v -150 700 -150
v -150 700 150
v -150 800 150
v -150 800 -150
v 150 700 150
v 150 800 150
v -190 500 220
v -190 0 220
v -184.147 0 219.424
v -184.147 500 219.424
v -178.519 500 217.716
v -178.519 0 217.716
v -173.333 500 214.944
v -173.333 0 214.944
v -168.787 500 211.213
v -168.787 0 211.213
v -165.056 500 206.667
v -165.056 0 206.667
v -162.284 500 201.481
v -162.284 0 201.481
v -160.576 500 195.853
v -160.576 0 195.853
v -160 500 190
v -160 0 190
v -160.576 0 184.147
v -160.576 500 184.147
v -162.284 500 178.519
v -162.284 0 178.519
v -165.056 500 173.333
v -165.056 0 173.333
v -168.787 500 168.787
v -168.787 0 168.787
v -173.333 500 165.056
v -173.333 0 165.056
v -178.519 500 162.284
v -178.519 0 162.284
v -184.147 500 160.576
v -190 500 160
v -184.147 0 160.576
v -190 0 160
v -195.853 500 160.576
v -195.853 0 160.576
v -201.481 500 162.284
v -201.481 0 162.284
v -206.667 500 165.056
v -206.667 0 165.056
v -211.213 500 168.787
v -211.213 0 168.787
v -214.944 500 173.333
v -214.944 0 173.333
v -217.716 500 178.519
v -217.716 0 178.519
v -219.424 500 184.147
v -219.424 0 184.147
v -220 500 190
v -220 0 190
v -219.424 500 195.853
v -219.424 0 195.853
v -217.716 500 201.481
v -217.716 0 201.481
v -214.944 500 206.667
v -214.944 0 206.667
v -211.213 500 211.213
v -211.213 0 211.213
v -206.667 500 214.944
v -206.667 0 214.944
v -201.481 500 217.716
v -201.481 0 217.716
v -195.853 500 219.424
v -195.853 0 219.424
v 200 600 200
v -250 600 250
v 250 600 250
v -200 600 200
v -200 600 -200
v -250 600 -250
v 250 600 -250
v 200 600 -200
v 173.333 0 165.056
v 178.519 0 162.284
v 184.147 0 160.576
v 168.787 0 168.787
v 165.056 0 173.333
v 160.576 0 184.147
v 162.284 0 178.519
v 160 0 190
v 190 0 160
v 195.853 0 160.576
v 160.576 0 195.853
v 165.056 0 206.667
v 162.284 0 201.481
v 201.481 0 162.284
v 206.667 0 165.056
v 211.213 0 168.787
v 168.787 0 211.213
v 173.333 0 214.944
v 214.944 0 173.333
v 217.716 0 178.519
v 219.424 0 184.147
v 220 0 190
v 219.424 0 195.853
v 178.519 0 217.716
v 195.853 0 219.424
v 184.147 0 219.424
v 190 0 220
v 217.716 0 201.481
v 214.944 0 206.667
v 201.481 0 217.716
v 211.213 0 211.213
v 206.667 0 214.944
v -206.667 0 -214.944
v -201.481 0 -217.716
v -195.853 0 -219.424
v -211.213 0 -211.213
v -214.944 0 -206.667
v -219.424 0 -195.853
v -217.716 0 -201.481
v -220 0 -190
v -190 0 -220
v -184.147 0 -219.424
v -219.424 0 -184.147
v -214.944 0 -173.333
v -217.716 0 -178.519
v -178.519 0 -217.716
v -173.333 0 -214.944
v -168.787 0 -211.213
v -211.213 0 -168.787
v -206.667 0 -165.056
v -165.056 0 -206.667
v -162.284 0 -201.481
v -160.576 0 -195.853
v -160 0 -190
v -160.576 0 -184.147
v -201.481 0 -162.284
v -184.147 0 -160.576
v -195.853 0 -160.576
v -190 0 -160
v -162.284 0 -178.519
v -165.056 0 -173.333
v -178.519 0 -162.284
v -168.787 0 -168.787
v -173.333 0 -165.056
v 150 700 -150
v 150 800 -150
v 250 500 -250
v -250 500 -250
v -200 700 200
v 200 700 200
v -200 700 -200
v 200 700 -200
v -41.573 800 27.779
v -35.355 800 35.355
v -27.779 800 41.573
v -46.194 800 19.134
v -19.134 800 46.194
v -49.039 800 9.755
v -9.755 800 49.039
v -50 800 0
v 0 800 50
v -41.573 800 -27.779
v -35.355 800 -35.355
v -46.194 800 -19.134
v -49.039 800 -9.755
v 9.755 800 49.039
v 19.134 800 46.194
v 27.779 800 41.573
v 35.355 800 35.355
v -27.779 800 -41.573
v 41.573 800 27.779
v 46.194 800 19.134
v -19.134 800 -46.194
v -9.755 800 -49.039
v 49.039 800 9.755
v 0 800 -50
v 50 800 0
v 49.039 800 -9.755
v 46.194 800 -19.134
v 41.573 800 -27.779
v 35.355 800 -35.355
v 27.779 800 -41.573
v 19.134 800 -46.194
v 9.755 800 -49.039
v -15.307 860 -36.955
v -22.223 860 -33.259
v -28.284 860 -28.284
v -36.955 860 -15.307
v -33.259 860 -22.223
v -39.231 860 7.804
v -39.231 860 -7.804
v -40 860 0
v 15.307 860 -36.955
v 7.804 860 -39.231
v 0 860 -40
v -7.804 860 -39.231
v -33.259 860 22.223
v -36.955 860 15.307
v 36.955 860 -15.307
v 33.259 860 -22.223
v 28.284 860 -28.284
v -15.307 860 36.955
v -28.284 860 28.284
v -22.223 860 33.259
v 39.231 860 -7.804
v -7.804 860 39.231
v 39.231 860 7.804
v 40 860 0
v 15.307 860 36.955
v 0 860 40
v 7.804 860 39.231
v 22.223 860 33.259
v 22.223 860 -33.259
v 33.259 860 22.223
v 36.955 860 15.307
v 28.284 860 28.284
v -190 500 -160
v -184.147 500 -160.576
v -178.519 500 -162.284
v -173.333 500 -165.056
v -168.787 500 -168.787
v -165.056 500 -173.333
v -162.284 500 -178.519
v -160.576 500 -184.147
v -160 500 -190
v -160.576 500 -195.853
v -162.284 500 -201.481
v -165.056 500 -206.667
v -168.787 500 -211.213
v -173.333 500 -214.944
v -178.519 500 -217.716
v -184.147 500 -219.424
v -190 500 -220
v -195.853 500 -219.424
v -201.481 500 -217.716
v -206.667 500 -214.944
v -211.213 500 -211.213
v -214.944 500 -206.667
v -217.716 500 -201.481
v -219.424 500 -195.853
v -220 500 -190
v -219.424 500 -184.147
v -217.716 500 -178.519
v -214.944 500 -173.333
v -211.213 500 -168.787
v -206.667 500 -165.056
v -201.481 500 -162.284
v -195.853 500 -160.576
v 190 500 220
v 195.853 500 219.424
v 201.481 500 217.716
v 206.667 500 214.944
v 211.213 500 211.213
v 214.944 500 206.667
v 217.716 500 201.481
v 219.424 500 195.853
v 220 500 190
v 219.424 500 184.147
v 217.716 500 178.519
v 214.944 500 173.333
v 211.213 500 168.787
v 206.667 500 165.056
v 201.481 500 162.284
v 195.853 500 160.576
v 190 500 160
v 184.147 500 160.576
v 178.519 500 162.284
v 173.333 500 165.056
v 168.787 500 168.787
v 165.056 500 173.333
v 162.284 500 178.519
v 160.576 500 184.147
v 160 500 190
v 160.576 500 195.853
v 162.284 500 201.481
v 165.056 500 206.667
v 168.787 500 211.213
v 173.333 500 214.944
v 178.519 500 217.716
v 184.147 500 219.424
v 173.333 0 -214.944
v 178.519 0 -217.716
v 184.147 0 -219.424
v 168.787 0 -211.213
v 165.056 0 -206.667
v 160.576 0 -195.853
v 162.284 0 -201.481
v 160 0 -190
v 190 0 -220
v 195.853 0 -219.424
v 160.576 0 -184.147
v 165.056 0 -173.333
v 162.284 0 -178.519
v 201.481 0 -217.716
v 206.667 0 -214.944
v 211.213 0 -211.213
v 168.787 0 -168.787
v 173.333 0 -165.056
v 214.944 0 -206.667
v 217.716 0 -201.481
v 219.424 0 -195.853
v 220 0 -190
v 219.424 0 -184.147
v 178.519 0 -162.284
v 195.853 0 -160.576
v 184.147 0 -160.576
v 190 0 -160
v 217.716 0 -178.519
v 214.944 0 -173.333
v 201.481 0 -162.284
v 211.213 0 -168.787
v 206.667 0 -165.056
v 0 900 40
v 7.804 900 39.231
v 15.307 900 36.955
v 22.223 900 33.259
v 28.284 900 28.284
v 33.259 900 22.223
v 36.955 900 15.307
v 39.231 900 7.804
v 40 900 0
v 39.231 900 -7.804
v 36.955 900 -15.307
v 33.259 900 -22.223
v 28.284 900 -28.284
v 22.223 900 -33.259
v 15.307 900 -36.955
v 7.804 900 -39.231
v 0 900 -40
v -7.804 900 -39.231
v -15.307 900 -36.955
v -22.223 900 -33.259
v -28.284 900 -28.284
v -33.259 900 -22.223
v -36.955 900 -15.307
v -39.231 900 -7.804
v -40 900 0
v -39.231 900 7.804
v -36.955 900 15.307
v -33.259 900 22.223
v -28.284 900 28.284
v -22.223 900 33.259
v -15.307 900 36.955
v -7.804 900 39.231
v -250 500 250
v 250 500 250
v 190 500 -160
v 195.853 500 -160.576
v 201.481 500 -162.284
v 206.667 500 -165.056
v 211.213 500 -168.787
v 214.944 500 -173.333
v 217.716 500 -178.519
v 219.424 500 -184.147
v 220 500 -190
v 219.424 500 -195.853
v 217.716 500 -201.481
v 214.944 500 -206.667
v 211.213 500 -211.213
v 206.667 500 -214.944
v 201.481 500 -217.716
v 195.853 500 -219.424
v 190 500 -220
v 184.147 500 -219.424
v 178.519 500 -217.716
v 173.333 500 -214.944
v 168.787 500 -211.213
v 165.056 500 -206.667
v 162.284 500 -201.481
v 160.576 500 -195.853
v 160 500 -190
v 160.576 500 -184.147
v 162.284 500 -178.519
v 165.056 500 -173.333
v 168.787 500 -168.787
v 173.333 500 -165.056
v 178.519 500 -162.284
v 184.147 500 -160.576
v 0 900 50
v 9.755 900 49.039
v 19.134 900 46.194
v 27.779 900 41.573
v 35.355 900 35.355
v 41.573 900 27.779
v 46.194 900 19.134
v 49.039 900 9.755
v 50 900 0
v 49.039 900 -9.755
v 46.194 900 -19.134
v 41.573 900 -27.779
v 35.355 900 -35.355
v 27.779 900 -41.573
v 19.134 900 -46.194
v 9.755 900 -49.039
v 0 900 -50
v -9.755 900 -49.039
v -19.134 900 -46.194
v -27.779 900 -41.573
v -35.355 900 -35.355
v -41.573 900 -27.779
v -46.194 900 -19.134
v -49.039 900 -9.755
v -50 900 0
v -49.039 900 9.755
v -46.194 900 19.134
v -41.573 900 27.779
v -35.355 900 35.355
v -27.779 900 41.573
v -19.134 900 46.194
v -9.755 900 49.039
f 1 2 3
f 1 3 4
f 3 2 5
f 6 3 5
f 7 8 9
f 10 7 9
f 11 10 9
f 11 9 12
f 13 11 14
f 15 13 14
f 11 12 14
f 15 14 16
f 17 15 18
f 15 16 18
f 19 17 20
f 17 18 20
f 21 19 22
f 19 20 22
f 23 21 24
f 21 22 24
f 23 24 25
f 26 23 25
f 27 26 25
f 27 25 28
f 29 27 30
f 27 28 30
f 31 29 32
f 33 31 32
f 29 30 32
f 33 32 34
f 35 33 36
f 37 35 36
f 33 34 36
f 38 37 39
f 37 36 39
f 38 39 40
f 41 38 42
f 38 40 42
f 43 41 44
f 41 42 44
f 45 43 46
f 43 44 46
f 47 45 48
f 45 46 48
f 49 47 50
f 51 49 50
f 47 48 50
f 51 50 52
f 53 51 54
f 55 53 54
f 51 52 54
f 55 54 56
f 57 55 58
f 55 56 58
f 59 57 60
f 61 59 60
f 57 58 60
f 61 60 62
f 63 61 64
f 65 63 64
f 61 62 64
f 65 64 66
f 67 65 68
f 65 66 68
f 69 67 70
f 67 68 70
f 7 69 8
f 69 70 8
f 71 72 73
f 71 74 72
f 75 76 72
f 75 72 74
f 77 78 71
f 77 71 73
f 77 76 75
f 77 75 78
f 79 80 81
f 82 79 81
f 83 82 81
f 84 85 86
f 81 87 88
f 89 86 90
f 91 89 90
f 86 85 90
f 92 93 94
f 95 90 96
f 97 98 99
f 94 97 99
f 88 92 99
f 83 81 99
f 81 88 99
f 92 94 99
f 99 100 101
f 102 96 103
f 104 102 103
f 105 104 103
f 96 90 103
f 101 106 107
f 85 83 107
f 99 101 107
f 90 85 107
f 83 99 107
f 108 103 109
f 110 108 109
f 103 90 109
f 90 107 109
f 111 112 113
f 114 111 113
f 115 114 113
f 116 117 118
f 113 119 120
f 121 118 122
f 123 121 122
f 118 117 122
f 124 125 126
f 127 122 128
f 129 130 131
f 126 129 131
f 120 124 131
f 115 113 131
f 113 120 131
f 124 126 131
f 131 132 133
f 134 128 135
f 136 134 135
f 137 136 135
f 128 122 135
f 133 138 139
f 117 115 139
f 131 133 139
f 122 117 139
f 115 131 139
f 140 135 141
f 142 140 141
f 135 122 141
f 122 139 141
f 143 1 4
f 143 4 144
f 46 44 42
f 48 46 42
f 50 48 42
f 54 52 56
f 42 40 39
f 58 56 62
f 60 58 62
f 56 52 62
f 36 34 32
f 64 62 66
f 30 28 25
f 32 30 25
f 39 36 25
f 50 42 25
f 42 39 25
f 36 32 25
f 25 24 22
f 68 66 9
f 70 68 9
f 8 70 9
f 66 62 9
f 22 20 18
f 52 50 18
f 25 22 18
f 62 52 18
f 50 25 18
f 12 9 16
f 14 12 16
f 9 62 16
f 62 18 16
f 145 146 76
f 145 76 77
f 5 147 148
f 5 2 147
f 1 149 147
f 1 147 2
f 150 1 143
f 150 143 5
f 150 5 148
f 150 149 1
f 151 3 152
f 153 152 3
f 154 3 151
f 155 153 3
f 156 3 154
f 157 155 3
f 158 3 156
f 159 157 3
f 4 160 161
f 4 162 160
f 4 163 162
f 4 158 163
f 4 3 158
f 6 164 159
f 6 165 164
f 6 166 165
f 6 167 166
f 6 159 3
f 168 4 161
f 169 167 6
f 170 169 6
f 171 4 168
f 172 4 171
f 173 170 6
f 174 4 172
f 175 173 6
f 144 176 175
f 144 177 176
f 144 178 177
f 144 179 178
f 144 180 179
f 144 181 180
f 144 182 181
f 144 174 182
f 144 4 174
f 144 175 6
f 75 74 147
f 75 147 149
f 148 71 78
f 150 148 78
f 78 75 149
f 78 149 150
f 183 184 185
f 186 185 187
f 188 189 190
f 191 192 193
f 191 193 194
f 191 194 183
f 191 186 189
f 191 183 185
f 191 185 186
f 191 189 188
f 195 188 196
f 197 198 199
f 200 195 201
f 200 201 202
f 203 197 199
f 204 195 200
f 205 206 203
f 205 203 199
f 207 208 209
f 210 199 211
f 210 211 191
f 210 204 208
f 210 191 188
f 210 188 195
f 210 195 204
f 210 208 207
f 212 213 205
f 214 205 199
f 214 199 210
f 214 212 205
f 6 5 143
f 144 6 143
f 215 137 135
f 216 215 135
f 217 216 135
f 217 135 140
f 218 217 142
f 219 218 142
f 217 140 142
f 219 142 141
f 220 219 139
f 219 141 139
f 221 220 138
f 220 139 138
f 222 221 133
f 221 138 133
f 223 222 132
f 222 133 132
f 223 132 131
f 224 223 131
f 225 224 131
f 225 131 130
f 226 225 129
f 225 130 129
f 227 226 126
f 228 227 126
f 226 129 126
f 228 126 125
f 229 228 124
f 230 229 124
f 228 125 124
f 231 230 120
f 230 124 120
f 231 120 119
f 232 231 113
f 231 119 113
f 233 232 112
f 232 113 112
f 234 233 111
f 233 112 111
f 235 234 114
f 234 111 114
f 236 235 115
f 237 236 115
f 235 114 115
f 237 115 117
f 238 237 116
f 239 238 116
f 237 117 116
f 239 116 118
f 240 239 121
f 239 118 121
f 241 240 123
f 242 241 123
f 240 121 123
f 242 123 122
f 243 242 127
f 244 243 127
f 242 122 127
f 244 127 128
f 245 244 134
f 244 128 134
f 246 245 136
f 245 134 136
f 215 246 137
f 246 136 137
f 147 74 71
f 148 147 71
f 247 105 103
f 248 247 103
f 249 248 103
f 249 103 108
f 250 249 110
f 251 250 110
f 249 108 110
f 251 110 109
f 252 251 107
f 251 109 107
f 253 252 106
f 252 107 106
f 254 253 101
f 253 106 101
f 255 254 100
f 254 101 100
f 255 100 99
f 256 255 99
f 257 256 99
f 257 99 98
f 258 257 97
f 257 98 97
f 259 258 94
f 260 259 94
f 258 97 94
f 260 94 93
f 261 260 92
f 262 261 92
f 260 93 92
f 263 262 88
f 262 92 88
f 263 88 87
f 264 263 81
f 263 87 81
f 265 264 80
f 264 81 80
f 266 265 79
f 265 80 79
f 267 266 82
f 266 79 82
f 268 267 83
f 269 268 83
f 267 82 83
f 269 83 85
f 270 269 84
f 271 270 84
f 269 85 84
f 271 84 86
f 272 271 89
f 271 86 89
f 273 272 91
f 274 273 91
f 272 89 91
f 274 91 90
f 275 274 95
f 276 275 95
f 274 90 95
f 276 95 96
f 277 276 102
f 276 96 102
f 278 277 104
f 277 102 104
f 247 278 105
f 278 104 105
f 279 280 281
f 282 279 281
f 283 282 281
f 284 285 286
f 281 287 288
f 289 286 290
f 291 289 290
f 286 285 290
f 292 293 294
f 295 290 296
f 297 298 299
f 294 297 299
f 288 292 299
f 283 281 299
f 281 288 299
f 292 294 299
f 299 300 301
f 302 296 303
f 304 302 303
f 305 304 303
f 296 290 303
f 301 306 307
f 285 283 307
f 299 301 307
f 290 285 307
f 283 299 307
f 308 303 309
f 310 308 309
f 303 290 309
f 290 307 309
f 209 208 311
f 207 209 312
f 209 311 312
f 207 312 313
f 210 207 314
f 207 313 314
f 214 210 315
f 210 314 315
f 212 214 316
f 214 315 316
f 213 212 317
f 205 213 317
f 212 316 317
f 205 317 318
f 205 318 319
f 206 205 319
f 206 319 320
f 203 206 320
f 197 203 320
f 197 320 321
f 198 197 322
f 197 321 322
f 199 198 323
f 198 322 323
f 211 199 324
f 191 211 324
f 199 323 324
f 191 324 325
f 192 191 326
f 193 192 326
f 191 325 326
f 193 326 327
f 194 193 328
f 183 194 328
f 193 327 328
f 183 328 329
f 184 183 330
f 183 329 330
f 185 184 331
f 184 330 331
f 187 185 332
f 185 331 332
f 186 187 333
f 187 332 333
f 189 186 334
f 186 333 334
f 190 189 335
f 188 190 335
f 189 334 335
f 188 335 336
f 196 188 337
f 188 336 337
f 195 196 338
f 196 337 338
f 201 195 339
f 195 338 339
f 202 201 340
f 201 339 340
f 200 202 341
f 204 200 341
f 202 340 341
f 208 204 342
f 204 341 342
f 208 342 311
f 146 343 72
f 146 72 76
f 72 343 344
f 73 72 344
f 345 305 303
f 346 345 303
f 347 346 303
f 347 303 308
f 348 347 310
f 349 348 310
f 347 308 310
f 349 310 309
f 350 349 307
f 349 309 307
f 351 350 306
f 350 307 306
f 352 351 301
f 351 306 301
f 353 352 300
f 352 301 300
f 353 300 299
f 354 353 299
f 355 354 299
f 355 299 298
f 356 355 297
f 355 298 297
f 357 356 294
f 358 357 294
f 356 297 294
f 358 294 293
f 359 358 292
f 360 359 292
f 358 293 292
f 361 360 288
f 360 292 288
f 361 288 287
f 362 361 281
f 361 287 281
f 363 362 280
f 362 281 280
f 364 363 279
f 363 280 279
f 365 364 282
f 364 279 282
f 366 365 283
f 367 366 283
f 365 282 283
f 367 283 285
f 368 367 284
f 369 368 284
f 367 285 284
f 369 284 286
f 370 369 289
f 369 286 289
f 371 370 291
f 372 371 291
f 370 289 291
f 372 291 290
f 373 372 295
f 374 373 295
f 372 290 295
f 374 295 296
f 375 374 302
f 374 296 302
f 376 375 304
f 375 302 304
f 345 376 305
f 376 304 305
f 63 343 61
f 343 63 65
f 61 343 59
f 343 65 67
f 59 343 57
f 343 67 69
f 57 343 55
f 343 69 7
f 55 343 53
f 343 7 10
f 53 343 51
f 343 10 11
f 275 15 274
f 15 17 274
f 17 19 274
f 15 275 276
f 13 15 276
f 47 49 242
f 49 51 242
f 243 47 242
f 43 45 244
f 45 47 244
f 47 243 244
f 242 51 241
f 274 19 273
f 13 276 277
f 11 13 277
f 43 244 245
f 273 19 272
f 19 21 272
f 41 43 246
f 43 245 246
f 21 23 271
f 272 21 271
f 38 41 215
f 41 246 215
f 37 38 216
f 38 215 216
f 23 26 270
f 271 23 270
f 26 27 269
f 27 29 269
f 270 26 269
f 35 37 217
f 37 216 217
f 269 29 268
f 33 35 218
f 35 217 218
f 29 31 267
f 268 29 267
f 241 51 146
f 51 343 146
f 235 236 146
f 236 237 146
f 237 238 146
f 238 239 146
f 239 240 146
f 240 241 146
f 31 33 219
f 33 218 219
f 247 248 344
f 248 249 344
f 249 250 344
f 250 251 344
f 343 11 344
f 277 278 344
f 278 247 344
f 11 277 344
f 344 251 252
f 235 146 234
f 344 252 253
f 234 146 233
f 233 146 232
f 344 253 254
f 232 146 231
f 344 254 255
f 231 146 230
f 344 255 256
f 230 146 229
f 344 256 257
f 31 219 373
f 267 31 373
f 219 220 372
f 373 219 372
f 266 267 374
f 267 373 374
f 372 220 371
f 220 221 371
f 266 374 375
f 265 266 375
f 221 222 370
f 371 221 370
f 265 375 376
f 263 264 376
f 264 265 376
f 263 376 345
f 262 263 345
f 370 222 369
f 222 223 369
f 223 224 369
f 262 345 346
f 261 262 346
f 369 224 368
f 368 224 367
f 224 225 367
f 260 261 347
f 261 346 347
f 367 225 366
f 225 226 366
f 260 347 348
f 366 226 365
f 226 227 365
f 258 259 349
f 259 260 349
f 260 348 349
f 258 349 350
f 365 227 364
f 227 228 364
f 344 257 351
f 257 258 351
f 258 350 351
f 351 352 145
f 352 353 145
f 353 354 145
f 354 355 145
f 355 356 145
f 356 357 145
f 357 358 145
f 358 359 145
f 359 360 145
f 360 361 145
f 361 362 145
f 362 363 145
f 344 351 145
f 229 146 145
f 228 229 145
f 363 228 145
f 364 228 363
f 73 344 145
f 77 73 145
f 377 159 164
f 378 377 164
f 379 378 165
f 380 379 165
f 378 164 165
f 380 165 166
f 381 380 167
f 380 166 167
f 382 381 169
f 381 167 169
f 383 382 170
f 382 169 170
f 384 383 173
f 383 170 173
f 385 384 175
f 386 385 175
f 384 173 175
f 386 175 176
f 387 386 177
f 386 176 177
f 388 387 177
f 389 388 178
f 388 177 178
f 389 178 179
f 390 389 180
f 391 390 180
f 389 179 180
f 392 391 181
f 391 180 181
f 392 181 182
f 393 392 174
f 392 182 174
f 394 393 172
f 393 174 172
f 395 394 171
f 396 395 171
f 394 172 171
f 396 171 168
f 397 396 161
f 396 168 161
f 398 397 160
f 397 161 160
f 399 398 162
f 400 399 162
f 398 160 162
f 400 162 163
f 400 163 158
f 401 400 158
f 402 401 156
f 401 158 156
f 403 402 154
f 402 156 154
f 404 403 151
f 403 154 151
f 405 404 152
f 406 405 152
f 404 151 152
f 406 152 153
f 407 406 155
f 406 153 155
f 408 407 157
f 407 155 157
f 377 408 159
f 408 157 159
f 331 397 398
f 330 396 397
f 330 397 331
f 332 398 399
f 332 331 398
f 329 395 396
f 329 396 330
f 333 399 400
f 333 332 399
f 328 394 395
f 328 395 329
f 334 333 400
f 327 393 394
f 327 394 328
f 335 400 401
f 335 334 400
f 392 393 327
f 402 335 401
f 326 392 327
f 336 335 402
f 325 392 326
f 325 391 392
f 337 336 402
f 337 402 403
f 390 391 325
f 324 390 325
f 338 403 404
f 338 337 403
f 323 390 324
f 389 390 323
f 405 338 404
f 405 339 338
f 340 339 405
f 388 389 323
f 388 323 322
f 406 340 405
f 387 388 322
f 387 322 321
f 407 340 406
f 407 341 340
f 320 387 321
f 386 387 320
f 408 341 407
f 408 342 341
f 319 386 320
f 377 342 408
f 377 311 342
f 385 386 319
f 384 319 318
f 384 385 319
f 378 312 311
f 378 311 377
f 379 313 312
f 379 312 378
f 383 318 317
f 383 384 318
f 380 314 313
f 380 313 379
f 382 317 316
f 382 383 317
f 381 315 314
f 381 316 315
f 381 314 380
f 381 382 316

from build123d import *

# Parameters (mm, degrees)
SKETCH1_R             = 30
BOSS_EXTRUDE1_DEPTH   = 500
BOSS_EXTRUDE1_2_DEPTH = 500
BOSS_EXTRUDE1_3_DEPTH = 500
BOSS_EXTRUDE1_4_DEPTH = 500
SKETCH2_W             = 500
SKETCH2_H             = 500
BOSS_EXTRUDE2_DEPTH   = 100
SKETCH3_W             = 400
SKETCH3_H             = 400
BOSS_EXTRUDE3_DEPTH   = 100
SKETCH4_W             = 300
SKETCH4_H             = 300
BOSS_EXTRUDE4_DEPTH   = 100
SKETCH5_R             = 50
BOSS_EXTRUDE5_DEPTH   = 100
SKETCH6_R             = 40
CUT_EXTRUDE1_DEPTH    = 40


with BuildPart() as part:
    # Sketch1 → Boss-Extrude1 (new body)
    with BuildSketch(Plane(origin=(0, 0, 0), x_dir=(1, 0, 0), z_dir=(0, 1, 0))):
        with Locations(Location((-190, -190, 0), (0, 0, 270))):
            Circle(SKETCH1_R)
    extrude(amount=BOSS_EXTRUDE1_DEPTH)



with BuildPart() as body_2:
    # Sketch1 → Boss-Extrude1 2 (new body)
    with BuildSketch(Plane(origin=(0, 0, 0), x_dir=(1, 0, 0), z_dir=(0, 1, 0))):
        with Locations(Location((-190, 190, 0), (0, 0, 270))):
            Circle(SKETCH1_R)
    extrude(amount=BOSS_EXTRUDE1_2_DEPTH)


with BuildPart() as body_3:
    # Sketch1 → Boss-Extrude1 3 (new body)
    with BuildSketch(Plane(origin=(0, 0, 0), x_dir=(1, 0, 0), z_dir=(0, 1, 0))):
        with Locations(Location((190, 190, 0), (0, 0, 270))):
            Circle(SKETCH1_R)
    extrude(amount=BOSS_EXTRUDE1_3_DEPTH)


with BuildPart() as body_4:
    # Sketch1 → Boss-Extrude1 4 (new body)
    with BuildSketch(Plane(origin=(0, 0, 0), x_dir=(1, 0, 0), z_dir=(0, 1, 0))):
        with Locations(Location((190, -190, 0), (0, 0, 270))):
            Circle(SKETCH1_R)
    extrude(amount=BOSS_EXTRUDE1_4_DEPTH)


with BuildPart() as part_1:
    add(part.part)

    add(body_2.part)  # Boss-Extrude2 merges body 2

    add(body_3.part)  # Boss-Extrude2 merges body 3

    add(body_4.part)  # Boss-Extrude2 merges body 4
    # Sketch2 → Boss-Extrude2 (add)
    with BuildSketch(Plane(origin=(0, 500, 0), x_dir=(1, 0, 0), z_dir=(0, 1, 0))):
        Rectangle(SKETCH2_W, SKETCH2_H)
    extrude(amount=BOSS_EXTRUDE2_DEPTH)

    # Sketch3 → Boss-Extrude3 (add)
    with BuildSketch(Plane(origin=(0, 600, 0), x_dir=(1, 0, 0), z_dir=(0, 1, 0))):
        Rectangle(SKETCH3_W, SKETCH3_H)
    extrude(amount=BOSS_EXTRUDE3_DEPTH)

    # Sketch4 → Boss-Extrude4 (add)
    with BuildSketch(Plane(origin=(0, 700, 0), x_dir=(1, 0, 0), z_dir=(0, 1, 0))):
        Rectangle(SKETCH4_W, SKETCH4_H)
    extrude(amount=BOSS_EXTRUDE4_DEPTH)

    # Sketch5 → Boss-Extrude5 (add)
    with BuildSketch(Plane(origin=(0, 800, 0), x_dir=(1, 0, 0), z_dir=(0, 1, 0))):
        with Locations(Location((0, 0, 0), (0, 0, 270))):
            Circle(SKETCH5_R)
    extrude(amount=BOSS_EXTRUDE5_DEPTH)

    # Sketch6 → Cut-Extrude1 (cut)
    with BuildSketch(Plane(origin=(0, 900, 0), x_dir=(1, 0, 0), z_dir=(0, 1, 0))):
        with Locations(Location((0, 0, 0), (0, 0, 270))):
            Circle(SKETCH6_R)
    extrude(amount=-CUT_EXTRUDE1_DEPTH, mode=Mode.SUBTRACT)


solid = part_1.part
